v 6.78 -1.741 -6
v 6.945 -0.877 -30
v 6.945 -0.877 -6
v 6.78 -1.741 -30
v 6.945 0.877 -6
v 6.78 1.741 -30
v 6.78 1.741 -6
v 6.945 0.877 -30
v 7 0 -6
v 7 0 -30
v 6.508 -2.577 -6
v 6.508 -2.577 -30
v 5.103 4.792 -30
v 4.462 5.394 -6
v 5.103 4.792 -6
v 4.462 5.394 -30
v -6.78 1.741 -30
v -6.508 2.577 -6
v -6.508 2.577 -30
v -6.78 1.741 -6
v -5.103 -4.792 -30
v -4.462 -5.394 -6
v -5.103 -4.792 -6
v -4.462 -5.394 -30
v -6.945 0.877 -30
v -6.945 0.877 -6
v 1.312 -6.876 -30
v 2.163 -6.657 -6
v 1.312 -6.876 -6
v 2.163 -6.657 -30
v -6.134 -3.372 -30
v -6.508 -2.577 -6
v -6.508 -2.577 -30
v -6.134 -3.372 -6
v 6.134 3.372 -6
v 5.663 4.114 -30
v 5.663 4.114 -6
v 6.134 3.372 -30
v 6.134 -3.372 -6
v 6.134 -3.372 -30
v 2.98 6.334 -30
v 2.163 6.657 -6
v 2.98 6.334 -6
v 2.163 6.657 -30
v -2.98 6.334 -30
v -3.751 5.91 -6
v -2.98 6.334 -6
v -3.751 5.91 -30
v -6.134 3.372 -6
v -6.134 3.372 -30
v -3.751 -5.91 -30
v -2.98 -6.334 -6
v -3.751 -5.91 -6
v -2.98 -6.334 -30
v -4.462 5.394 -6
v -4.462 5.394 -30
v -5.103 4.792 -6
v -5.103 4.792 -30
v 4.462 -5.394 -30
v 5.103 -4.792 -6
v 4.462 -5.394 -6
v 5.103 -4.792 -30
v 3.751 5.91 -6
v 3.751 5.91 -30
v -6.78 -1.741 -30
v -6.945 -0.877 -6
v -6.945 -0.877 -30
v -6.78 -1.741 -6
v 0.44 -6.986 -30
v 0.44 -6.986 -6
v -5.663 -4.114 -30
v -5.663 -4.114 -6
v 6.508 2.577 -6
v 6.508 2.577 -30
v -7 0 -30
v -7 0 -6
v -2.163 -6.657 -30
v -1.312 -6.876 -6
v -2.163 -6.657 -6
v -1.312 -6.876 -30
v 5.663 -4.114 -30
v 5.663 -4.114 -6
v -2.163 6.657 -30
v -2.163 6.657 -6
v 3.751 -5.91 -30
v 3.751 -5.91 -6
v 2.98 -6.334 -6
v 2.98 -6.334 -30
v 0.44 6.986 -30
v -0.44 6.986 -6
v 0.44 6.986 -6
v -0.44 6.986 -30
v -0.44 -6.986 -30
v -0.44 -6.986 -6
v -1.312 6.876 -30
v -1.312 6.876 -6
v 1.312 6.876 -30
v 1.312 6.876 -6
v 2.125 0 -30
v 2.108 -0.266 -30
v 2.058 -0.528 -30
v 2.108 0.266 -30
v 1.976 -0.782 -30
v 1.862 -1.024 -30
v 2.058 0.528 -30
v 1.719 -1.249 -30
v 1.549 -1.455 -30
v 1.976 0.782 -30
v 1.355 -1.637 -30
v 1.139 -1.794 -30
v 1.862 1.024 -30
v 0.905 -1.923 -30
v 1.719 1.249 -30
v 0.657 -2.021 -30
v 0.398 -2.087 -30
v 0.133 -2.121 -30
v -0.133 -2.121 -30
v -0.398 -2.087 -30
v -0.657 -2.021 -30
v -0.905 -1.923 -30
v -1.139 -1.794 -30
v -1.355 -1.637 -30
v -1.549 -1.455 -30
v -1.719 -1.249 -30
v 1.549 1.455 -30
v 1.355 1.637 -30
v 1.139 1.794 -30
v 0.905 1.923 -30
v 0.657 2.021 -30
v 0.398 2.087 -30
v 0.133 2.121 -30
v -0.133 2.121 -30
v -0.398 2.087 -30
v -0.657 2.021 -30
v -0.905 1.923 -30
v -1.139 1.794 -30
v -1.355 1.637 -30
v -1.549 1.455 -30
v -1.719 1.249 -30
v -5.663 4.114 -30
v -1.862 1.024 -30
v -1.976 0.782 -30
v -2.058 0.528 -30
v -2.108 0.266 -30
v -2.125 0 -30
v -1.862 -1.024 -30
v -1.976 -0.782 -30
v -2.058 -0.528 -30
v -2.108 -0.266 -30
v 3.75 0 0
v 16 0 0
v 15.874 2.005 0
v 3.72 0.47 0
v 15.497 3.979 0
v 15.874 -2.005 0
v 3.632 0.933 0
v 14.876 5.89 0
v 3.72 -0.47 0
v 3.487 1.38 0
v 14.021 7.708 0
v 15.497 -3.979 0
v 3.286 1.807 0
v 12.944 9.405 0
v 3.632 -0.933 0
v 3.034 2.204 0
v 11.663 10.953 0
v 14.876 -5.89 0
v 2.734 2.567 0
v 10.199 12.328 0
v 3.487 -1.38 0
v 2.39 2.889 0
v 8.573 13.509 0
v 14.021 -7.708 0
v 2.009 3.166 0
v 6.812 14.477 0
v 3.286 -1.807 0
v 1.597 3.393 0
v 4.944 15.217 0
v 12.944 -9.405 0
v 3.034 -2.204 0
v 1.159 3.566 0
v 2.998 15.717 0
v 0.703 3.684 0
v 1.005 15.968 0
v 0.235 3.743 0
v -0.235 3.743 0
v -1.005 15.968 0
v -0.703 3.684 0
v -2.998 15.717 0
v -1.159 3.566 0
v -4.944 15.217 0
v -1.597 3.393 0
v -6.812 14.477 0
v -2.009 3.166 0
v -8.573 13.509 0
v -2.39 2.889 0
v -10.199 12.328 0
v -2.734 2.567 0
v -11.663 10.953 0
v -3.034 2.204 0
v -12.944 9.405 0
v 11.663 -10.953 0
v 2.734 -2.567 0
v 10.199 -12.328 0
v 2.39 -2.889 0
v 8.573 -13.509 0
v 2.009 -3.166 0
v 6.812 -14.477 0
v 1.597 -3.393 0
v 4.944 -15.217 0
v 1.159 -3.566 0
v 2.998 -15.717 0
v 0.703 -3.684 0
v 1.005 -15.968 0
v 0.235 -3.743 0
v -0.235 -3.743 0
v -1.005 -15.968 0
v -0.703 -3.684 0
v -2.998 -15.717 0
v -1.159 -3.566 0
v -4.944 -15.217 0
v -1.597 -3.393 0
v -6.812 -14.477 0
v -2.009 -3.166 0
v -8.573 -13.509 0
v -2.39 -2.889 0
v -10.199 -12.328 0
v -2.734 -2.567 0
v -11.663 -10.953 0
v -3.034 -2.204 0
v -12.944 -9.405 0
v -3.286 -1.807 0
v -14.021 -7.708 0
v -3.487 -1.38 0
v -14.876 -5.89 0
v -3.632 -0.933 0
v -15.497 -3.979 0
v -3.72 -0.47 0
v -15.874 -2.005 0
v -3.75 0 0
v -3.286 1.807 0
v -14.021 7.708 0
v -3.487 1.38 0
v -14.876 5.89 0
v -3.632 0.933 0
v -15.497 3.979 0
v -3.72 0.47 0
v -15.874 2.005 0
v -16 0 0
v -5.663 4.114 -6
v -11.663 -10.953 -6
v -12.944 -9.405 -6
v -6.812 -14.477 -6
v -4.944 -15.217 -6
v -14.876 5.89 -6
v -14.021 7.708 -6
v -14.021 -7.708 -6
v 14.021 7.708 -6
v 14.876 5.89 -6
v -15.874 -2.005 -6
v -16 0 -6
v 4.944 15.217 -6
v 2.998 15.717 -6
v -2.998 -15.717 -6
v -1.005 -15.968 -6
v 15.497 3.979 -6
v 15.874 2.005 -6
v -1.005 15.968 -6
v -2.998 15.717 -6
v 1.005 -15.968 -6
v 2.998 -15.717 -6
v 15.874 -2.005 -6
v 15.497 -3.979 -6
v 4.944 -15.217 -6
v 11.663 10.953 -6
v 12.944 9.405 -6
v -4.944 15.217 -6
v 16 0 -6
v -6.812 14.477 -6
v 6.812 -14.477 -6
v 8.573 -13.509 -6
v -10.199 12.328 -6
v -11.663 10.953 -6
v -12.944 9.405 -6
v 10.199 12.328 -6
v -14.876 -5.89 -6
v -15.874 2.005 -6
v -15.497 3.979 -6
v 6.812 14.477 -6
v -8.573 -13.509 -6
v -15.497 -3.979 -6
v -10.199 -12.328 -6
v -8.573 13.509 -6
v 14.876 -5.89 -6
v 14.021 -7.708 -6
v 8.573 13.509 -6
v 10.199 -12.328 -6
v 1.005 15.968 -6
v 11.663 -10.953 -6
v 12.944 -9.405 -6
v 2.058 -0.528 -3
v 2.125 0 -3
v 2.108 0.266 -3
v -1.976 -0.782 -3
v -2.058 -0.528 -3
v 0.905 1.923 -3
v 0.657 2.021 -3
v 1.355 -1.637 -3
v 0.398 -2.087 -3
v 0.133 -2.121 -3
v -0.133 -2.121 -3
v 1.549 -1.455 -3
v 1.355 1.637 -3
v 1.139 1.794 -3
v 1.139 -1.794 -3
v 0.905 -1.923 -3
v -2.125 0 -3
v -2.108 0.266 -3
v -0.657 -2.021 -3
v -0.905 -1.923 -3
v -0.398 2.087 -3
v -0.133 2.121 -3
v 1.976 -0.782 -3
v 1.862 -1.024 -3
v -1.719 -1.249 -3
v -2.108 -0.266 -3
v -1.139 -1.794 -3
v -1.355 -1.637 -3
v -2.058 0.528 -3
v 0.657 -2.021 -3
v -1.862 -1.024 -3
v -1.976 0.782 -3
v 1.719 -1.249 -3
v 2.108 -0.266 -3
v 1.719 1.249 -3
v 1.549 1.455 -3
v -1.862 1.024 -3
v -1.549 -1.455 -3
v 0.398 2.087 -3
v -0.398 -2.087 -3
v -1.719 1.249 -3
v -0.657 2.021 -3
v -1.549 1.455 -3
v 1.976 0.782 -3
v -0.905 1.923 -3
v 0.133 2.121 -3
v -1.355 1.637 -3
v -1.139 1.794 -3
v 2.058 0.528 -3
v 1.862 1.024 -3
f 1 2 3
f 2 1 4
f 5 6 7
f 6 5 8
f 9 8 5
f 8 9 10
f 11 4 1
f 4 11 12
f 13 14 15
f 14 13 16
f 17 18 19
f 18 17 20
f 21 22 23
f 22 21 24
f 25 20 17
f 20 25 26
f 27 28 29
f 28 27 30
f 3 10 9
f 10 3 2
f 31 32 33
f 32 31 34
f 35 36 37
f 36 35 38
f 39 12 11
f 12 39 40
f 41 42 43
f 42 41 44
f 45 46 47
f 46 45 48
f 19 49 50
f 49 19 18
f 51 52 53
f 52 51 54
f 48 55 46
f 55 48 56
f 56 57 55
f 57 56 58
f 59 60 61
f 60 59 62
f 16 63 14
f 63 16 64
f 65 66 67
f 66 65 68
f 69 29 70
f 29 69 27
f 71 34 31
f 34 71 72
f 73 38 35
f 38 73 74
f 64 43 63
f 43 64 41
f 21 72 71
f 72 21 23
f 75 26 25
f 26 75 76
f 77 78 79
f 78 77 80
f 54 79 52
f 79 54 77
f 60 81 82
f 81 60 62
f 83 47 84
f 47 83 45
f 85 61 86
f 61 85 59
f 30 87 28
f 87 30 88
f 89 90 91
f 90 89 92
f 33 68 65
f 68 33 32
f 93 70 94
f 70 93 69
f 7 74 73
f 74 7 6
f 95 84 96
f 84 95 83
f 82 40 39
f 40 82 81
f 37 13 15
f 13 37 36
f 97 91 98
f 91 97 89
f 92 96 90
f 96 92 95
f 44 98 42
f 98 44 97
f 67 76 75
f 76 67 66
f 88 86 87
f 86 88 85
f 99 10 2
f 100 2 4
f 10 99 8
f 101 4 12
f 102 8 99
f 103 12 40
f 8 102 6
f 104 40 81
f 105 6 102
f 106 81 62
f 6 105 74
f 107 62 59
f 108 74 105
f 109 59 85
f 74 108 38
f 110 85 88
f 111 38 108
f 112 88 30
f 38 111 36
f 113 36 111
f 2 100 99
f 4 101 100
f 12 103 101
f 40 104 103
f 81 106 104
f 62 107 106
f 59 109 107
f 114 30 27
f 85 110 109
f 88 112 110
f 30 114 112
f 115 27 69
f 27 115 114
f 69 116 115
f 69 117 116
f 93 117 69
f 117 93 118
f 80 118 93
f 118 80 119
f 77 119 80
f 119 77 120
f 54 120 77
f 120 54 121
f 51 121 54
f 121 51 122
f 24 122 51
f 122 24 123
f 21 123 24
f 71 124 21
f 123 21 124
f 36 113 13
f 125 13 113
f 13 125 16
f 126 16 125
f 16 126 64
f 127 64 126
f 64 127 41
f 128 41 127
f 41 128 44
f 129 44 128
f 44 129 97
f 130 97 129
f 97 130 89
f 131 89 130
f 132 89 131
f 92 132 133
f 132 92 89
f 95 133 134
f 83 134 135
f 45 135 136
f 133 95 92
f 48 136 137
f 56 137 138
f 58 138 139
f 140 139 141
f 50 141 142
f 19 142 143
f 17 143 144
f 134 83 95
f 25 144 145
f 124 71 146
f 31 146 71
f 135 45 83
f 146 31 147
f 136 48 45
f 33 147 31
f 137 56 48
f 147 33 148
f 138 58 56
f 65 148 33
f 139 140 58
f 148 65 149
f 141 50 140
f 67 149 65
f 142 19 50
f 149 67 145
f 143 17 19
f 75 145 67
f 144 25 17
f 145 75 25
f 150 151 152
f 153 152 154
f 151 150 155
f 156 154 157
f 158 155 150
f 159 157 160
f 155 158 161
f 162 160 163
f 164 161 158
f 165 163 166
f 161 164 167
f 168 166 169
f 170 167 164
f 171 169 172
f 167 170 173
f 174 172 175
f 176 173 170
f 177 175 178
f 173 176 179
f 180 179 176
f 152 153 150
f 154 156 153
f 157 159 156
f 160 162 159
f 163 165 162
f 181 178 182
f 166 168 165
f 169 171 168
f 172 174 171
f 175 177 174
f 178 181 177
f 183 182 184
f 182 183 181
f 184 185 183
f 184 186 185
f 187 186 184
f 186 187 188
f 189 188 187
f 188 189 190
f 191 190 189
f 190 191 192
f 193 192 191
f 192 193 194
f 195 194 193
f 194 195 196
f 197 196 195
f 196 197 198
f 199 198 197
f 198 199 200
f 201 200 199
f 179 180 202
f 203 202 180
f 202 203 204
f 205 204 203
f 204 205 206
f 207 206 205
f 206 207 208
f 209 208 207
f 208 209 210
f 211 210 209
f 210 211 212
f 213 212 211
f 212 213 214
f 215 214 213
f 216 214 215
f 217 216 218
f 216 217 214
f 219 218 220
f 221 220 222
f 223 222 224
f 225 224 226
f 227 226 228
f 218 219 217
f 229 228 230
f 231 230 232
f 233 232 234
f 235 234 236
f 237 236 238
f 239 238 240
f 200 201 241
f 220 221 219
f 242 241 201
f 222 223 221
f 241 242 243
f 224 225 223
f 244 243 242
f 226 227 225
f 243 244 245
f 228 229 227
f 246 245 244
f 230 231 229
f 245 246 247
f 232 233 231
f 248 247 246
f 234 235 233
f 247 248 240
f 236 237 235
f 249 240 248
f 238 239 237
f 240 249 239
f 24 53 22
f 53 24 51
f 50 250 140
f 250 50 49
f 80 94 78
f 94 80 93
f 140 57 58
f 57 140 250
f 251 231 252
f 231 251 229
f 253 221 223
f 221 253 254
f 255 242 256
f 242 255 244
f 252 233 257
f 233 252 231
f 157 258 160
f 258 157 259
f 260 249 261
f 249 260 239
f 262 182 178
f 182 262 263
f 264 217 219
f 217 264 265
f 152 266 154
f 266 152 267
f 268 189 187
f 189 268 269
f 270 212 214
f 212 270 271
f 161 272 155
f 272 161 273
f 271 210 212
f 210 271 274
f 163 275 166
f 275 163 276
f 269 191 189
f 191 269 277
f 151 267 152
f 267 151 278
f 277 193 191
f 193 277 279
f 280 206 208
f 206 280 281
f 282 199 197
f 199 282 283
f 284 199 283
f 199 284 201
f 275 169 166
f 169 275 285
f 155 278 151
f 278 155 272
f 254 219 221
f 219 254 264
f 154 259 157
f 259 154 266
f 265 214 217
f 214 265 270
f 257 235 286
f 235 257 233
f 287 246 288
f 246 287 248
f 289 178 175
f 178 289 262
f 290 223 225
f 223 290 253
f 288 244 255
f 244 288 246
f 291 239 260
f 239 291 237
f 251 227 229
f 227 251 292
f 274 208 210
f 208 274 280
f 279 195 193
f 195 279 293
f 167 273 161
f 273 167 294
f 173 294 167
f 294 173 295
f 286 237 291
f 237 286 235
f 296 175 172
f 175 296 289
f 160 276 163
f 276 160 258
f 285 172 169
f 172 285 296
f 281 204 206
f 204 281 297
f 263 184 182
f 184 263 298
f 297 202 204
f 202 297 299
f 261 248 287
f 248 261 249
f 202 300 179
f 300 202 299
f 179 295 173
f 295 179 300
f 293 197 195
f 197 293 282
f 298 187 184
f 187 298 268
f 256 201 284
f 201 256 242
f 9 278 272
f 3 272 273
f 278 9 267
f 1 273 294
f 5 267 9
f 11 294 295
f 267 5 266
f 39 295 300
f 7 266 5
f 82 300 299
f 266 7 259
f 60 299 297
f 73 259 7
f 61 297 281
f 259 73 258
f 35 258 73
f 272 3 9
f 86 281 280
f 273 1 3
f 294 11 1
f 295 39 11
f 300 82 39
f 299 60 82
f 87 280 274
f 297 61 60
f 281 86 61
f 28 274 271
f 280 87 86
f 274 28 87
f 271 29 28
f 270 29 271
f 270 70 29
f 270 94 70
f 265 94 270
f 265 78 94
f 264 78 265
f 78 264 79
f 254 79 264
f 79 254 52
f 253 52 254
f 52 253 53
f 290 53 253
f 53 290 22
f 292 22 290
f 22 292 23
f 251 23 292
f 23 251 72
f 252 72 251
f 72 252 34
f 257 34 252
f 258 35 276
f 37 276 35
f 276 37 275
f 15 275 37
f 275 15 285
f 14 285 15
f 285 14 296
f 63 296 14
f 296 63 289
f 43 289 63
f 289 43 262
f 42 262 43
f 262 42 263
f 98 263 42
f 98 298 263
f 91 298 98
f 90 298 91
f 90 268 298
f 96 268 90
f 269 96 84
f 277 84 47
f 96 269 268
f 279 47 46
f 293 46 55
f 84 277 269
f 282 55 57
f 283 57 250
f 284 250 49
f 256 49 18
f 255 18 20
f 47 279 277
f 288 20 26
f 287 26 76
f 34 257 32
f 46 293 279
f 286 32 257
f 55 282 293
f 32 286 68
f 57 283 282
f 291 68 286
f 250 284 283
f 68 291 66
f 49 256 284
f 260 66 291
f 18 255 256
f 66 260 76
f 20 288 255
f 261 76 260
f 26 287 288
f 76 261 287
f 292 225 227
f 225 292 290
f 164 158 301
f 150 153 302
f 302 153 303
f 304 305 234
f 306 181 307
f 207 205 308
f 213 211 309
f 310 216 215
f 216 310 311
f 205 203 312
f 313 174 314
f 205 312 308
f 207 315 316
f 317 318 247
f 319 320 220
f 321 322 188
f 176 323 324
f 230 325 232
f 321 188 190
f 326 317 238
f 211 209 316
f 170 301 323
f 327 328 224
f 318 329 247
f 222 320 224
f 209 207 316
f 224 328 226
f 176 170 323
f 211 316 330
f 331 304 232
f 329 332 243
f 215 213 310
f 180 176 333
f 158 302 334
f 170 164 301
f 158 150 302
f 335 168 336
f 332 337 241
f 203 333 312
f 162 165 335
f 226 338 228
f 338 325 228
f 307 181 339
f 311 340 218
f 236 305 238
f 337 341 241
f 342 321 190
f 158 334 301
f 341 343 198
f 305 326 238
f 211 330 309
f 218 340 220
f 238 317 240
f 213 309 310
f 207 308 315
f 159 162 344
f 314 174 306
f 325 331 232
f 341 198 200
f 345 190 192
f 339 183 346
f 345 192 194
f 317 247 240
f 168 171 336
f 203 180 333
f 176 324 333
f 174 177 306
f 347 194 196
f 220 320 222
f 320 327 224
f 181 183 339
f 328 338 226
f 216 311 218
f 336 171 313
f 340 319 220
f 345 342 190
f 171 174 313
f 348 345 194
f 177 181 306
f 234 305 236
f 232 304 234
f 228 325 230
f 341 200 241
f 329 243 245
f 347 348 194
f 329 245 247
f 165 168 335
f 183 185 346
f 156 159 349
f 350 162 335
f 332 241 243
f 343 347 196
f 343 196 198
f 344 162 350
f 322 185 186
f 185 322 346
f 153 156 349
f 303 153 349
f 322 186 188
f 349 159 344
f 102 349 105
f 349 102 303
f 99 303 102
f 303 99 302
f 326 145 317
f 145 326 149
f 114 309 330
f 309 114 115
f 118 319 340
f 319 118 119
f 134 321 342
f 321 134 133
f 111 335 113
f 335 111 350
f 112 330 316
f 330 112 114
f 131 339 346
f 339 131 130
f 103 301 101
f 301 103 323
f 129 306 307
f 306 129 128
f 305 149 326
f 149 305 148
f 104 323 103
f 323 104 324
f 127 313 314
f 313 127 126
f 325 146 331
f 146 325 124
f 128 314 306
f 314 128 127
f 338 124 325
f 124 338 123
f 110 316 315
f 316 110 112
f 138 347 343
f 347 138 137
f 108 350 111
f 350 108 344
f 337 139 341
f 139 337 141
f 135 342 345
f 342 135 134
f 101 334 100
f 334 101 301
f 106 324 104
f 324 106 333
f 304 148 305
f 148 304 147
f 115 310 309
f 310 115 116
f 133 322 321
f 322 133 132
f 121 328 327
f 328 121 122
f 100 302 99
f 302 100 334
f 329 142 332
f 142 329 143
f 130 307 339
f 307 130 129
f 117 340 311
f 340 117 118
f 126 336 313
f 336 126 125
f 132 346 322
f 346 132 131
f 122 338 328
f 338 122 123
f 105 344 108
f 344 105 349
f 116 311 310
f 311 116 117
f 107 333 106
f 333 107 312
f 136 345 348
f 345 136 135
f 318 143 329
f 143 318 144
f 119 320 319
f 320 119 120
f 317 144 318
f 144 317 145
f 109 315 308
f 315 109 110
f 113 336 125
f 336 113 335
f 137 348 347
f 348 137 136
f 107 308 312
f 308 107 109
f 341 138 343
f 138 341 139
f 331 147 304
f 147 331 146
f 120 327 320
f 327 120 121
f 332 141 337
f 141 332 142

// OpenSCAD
$fn = 50;


difference() {
	union() {
		translate(v = [0, 0, -30.0000000000]) {
			cylinder(h = 30, r = 7.0000000000);
		}
		translate(v = [0, 0, -6.0000000000]) {
			cylinder(h = 6, r = 16.0000000000);
		}
	}
	union() {
		translate(v = [0, 0, 0]) {
			rotate(a = [0, 0, 0]) {
				difference() {
					union() {
						#translate(v = [0, 0, -30.0000000000]) {
							cylinder(h = 30, r = 2.0000000000);
						}
						#translate(v = [0, 0, -3]) {
							cylinder(h = 3, r = 7.0000000000, r1 = 2.1250000000, r2 = 3.7500000000);
						}
						#translate(v = [0, 0, -30.0000000000]) {
							cylinder(h = 30, r = 2.1250000000);
						}
						#translate(v = [0, 0, -30.0000000000]) {
							cylinder(h = 30, r = 2.0000000000);
						}
					}
					union();
				}
			}
		}
	}
}
